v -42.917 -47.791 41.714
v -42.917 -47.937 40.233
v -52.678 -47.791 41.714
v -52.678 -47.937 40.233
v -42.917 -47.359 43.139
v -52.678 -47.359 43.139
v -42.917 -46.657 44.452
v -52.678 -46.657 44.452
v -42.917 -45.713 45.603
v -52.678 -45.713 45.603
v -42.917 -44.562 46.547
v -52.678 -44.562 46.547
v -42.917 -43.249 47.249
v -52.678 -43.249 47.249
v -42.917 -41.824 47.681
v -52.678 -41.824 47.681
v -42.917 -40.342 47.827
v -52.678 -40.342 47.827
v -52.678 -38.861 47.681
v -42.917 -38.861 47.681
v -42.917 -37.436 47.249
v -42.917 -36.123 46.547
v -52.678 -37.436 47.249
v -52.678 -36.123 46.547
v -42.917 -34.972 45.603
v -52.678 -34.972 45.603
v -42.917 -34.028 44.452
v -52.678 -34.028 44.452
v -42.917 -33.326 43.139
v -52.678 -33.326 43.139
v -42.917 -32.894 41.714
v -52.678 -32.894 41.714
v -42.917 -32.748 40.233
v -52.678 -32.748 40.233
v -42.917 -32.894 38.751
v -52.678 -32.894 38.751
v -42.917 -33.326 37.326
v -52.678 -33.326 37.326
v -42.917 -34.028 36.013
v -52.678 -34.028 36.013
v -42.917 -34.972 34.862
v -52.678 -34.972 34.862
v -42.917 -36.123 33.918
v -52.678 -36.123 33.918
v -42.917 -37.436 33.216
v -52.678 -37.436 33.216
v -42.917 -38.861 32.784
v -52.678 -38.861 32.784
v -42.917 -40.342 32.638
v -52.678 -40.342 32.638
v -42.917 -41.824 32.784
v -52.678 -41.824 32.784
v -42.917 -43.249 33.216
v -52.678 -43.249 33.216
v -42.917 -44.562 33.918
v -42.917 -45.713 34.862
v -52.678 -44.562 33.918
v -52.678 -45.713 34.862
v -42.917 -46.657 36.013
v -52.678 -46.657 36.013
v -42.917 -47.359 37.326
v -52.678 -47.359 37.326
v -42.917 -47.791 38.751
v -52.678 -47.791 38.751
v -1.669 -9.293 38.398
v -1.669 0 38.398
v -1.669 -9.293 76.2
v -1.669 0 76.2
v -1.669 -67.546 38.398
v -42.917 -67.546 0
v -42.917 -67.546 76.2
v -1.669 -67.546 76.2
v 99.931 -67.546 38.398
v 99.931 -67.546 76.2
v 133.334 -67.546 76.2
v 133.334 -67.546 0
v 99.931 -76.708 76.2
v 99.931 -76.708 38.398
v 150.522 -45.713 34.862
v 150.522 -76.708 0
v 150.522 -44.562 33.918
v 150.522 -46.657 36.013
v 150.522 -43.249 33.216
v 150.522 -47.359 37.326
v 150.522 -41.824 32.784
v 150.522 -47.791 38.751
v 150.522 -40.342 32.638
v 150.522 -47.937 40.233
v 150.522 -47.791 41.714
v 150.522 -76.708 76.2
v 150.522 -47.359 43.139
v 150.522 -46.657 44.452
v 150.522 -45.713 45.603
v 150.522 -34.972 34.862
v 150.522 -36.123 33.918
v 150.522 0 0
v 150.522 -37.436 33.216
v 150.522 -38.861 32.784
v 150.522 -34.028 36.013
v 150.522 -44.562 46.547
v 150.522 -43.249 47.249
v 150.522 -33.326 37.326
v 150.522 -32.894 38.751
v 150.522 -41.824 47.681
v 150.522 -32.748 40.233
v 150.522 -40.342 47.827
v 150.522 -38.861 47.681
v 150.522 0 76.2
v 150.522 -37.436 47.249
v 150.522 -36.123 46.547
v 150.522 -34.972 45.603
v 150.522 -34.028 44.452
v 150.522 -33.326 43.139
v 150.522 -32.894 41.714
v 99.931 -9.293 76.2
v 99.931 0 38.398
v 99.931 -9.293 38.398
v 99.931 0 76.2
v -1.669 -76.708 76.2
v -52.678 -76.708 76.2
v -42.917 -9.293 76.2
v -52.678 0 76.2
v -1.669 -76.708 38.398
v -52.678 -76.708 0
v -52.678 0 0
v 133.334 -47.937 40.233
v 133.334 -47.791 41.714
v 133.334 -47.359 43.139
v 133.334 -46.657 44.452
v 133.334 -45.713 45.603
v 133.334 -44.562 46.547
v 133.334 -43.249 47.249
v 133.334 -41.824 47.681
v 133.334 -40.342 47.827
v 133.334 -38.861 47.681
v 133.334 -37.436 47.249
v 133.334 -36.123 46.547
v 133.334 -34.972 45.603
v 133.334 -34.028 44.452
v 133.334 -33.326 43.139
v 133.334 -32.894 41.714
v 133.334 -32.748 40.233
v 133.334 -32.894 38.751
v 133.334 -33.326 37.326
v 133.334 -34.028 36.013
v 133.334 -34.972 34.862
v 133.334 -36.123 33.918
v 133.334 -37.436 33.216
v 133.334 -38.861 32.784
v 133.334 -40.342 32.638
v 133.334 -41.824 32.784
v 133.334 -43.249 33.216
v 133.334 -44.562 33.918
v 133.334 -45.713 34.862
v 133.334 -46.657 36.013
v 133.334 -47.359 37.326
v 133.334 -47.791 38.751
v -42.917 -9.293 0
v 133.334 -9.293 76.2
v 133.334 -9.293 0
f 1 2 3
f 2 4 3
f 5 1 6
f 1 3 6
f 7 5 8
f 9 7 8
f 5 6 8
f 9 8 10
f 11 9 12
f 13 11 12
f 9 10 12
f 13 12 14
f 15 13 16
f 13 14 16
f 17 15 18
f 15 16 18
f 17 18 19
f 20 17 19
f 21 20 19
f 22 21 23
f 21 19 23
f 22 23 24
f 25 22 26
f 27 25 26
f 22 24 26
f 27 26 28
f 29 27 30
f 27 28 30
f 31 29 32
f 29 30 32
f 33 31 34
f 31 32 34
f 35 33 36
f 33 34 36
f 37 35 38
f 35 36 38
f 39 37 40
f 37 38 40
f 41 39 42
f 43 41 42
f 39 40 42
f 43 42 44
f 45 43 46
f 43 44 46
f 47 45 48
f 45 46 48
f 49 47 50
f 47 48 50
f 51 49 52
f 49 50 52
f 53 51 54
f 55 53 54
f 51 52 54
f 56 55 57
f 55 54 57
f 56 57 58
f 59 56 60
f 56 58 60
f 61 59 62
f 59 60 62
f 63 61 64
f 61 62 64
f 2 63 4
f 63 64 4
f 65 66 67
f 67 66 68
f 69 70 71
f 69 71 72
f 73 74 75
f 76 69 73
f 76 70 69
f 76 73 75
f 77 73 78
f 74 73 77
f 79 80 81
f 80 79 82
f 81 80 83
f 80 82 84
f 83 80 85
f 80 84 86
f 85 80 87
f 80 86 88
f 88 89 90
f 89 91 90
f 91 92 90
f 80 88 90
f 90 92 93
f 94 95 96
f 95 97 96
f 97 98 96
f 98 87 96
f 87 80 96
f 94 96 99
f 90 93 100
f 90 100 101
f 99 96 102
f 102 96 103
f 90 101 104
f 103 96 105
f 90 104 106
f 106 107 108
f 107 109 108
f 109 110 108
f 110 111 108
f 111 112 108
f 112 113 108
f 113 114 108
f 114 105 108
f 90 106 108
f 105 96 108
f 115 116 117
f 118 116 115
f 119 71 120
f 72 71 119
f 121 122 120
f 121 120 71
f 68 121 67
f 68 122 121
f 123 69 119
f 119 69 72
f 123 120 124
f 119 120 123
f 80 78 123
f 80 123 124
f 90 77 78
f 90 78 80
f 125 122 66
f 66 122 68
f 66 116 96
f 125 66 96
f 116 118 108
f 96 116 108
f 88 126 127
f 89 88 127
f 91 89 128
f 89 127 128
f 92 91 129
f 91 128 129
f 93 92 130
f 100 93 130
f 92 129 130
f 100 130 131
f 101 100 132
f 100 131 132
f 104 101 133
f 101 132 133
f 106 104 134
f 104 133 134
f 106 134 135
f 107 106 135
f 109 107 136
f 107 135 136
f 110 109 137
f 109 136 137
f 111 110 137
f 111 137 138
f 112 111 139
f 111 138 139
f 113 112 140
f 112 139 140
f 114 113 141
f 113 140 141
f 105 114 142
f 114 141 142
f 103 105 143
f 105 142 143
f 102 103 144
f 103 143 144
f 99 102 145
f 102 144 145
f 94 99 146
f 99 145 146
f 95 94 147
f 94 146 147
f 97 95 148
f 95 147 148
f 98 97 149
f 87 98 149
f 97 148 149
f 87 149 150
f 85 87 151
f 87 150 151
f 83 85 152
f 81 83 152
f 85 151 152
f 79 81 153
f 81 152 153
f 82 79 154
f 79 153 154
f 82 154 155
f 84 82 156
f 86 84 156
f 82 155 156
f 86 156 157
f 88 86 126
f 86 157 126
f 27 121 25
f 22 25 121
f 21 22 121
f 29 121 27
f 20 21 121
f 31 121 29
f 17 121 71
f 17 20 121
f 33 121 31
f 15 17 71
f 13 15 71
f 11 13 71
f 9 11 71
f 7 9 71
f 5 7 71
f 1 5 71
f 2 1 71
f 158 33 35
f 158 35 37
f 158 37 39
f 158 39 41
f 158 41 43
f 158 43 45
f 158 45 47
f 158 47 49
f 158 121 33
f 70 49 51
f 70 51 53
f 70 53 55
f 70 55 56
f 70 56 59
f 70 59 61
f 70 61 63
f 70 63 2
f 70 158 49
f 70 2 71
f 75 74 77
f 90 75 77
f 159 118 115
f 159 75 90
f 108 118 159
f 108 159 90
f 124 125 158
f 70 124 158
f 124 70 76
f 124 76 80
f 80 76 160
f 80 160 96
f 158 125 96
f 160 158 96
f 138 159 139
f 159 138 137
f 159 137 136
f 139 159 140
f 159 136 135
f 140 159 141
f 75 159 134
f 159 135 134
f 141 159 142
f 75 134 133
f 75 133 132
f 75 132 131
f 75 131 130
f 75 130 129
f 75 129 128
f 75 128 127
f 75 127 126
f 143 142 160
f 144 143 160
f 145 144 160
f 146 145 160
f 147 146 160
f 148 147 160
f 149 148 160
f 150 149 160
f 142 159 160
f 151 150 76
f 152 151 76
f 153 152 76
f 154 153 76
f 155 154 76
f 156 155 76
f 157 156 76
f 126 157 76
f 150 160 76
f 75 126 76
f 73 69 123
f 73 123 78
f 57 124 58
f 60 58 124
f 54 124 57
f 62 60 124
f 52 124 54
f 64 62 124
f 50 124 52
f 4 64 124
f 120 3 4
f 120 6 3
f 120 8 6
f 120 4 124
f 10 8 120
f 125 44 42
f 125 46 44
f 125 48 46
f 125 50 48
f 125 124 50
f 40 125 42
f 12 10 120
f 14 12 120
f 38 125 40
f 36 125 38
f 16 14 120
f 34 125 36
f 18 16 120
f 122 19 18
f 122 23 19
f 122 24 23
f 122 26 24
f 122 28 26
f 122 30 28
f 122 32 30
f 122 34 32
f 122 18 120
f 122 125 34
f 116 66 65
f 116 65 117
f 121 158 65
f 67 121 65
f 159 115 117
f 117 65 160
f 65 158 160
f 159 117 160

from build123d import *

# Parameters (mm, degrees)
F0_W     = 203.2
F0_H     = 76.2
F1_DEPTH = 76.708
F2_W     = 101.6
F2_H     = 38.1
F3_DEPTH = 116.332
F4_R     = 7.5946
F5_DEPTH = 234.95
F6_W     = 176.251258
F6_H     = 58.252844
F7_DEPTH = 93.472


with BuildPart() as f1:
    # F0 (on Front) → F1 (new body)
    with BuildSketch(Plane.XZ):
        with Locations((48.921661, 38.1)):
            Rectangle(F0_W, F0_H)
    extrude(amount=F1_DEPTH)

    # F2 (on Front) → F3 (cut)
    with BuildSketch(Plane.XZ):
        with Locations((49.131309, 57.448106)):
            Rectangle(F2_W, F2_H)
    extrude(amount=F3_DEPTH, mode=Mode.SUBTRACT)

    # F4 (on face) → F5 (cut, symmetric)
    with BuildSketch(Plane(origin=(-52.678339, 0, 0), x_dir=(0, -1, 0), z_dir=(-1, 0, 0))):
        with Locations((40.342383, 40.232584)):
            Circle(F4_R)
    extrude(amount=F5_DEPTH, both=True, mode=Mode.SUBTRACT)

    # F6 (on face) → F7 (cut)
    with BuildSketch(Plane(origin=(0, 0, 0), x_dir=(1, 0, 0), z_dir=(0, 0, -1))):
        with Locations((45.208322, 38.419208)):
            Rectangle(F6_W, F6_H)
    extrude(amount=-F7_DEPTH, mode=Mode.SUBTRACT)


solid = f1.part
